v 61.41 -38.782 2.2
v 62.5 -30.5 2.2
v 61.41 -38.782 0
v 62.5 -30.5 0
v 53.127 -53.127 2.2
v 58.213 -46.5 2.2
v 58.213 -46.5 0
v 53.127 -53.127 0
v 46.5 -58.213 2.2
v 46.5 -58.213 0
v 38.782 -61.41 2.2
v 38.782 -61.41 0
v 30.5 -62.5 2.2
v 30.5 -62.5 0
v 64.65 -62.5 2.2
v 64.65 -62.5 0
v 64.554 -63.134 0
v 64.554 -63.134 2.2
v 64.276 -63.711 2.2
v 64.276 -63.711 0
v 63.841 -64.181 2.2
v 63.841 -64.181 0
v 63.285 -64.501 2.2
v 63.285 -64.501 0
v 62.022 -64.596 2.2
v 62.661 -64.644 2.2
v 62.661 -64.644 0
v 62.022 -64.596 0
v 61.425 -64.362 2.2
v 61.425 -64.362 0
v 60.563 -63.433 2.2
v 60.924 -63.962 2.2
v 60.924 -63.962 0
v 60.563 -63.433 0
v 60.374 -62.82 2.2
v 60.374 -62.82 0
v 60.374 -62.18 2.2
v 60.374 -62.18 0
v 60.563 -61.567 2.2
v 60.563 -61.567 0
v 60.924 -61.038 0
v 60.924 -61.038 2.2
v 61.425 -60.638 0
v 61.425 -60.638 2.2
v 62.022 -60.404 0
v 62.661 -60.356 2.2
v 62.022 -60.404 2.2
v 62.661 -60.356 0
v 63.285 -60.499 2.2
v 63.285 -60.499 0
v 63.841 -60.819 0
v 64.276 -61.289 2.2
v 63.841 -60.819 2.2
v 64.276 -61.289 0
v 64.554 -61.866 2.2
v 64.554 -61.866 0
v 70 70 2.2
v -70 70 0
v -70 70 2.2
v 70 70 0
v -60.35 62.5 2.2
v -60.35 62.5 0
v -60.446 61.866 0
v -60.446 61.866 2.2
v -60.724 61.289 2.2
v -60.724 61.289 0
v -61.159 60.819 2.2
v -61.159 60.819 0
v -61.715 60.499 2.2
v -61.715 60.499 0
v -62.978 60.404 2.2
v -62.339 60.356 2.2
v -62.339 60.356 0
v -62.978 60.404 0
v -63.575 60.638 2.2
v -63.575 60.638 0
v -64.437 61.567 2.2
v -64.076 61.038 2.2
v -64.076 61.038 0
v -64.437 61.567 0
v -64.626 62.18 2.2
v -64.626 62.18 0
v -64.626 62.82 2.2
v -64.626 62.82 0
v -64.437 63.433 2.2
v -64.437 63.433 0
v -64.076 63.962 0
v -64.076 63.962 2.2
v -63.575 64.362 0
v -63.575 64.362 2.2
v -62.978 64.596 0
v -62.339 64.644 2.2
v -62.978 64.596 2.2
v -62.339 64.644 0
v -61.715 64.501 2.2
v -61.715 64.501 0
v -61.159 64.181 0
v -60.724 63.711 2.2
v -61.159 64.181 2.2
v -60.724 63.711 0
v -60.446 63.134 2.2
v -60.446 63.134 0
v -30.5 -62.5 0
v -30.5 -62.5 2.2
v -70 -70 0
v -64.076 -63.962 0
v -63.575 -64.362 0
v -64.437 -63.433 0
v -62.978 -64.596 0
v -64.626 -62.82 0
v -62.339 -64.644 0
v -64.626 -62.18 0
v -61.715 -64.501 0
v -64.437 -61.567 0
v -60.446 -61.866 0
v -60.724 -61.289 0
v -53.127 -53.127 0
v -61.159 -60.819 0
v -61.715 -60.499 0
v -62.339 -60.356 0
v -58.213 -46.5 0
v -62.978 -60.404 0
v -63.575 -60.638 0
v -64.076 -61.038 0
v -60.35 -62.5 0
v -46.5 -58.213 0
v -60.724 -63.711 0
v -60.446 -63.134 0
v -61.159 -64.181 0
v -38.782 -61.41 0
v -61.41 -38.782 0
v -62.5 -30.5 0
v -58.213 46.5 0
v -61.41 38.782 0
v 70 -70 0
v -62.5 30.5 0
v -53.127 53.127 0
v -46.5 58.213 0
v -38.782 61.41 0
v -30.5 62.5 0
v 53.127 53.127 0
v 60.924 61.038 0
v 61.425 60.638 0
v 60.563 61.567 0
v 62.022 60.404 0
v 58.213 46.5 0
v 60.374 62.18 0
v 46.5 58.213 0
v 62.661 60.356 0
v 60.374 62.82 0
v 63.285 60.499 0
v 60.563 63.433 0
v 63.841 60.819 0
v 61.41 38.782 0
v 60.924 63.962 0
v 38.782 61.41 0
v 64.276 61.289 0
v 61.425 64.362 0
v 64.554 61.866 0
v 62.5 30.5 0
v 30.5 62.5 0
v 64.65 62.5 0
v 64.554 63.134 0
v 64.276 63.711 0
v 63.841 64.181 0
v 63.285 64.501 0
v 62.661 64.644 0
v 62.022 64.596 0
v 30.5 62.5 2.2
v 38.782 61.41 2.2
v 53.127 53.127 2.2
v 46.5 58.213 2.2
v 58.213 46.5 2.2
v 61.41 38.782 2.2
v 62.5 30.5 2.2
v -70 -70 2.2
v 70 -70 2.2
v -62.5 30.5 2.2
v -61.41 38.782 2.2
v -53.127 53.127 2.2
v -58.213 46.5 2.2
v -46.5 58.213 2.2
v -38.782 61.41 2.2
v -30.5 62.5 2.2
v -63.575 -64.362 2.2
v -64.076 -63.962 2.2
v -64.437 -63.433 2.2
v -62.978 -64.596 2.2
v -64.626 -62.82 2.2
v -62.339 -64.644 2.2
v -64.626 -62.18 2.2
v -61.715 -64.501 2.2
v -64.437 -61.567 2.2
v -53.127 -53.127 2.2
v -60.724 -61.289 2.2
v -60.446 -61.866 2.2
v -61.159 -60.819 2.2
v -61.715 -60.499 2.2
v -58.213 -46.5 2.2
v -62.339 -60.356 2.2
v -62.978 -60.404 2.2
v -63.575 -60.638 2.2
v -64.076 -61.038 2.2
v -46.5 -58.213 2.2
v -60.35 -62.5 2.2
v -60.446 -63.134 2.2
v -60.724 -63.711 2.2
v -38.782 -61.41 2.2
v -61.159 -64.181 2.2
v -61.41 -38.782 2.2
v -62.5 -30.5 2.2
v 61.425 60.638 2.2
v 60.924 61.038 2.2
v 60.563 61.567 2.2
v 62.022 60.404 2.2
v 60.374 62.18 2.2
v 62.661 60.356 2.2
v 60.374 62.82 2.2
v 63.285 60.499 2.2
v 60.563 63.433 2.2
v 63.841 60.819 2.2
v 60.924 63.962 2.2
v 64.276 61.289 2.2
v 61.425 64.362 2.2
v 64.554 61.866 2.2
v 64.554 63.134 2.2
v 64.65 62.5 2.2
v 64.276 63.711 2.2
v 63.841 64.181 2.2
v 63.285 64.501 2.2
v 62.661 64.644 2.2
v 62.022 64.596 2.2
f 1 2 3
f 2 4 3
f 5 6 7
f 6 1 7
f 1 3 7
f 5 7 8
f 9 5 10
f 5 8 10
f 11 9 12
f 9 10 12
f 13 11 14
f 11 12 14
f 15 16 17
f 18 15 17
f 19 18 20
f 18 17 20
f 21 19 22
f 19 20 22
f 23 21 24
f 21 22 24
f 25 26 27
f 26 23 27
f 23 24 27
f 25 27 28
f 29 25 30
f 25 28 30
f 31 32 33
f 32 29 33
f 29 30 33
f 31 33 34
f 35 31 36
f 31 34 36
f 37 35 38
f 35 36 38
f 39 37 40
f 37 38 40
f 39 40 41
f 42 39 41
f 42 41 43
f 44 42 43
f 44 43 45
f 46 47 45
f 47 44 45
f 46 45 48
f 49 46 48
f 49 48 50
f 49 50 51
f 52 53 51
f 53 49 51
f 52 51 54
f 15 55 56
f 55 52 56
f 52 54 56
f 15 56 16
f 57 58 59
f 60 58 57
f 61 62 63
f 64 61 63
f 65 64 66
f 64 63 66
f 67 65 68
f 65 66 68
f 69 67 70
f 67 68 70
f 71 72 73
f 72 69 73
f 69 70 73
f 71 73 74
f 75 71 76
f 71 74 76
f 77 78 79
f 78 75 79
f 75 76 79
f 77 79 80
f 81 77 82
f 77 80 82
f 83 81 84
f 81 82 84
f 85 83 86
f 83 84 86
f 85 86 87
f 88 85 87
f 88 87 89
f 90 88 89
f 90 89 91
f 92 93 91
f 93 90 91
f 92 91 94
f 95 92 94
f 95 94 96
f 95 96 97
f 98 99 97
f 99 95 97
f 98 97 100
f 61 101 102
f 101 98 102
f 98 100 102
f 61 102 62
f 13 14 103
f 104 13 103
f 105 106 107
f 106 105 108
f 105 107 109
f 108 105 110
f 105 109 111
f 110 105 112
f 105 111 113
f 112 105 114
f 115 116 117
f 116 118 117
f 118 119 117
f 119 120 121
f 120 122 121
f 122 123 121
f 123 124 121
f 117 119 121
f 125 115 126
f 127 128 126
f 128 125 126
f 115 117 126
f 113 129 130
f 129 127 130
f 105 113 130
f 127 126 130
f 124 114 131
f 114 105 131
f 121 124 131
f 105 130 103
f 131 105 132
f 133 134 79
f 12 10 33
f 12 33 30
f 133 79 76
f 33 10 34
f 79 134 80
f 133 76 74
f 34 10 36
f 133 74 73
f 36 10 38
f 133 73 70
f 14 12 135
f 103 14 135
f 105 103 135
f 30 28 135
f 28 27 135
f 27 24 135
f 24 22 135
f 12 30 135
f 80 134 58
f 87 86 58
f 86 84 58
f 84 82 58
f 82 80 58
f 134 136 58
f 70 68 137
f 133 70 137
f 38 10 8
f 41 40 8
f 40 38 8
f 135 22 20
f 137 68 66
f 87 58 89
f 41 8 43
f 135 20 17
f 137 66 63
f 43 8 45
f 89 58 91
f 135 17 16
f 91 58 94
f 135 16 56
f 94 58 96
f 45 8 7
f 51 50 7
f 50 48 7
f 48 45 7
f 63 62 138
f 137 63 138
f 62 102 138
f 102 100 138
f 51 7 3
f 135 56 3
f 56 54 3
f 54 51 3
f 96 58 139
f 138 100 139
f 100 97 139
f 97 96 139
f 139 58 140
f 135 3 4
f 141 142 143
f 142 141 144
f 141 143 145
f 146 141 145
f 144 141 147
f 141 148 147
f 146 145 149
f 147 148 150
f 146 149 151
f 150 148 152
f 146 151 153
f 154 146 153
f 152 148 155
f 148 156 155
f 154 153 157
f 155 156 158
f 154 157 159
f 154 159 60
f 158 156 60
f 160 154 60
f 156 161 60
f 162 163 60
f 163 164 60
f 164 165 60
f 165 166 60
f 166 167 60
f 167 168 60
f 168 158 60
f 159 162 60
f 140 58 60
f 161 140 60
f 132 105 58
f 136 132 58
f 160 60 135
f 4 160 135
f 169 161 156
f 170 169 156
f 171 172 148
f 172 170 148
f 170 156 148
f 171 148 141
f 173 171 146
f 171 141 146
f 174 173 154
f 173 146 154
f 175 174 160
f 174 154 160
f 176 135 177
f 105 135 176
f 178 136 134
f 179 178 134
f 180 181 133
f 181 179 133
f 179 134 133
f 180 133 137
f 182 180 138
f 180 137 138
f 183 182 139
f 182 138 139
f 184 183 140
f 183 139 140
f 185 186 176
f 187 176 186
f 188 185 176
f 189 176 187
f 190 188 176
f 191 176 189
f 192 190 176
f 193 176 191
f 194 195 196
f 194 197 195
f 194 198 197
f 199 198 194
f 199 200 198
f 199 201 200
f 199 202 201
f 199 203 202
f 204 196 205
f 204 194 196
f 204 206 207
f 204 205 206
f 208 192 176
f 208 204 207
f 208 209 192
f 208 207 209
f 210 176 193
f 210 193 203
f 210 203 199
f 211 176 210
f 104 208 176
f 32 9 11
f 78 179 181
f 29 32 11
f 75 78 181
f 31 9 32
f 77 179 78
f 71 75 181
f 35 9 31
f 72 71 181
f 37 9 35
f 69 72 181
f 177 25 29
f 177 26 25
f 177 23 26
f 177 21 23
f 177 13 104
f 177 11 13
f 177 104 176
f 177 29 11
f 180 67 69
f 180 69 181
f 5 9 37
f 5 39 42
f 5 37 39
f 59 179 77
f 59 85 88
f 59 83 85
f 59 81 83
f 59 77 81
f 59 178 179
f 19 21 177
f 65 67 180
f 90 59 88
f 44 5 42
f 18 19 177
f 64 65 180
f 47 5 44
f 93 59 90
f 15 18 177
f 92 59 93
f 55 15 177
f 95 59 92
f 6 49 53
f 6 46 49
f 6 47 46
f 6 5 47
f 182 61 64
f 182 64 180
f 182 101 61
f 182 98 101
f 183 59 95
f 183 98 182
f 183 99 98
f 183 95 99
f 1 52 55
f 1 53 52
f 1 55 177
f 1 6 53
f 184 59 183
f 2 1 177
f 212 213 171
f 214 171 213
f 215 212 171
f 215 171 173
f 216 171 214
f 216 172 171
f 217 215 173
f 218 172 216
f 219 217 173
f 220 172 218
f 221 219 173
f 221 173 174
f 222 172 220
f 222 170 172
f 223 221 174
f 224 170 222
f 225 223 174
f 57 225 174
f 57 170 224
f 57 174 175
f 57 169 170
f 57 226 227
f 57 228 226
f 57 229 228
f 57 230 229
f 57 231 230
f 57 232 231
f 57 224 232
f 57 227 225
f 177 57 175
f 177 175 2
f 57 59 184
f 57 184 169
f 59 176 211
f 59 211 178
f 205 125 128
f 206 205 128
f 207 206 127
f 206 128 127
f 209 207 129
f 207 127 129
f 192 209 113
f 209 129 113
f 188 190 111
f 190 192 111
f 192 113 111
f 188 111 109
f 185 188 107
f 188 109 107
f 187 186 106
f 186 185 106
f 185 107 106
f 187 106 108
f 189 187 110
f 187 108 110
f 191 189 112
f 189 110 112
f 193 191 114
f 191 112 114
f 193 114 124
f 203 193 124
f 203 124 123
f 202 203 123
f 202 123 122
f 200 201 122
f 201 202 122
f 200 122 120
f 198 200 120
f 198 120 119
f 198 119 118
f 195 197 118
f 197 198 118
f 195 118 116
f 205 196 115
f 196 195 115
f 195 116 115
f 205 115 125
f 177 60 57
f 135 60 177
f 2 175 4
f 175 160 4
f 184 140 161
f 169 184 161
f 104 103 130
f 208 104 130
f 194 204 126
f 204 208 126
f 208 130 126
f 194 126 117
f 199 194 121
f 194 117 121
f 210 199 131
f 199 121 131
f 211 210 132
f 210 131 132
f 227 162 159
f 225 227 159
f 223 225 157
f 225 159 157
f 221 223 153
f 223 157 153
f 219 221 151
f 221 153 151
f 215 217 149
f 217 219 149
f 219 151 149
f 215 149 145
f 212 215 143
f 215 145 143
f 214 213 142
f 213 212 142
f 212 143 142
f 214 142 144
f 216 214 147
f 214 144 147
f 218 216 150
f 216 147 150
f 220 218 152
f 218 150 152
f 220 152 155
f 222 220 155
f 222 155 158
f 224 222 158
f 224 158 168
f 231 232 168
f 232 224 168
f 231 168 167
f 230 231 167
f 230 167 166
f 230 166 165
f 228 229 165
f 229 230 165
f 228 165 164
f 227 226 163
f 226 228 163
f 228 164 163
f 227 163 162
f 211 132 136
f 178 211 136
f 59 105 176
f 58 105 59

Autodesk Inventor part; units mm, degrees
ref_plane "YZ Plane" through (0, 0, 0) normal (1, 0, 0) x (0, 1, 0)
ref_plane "XZ Plane" through (0, 0, 0) normal (0, 1, 0) x (-1, 0, 0)
ref_plane "XY Plane" through (0, 0, 0) normal (0, 0, 1) x (1, 0, 0)
sketch "スケッチ1" plane through (0, 0, 0) normal (0, 0, 1) x (1, 0, 0)
  line L0 (-70, 70) -> (70, 70)
  line L1 (70, 70) -> (70, -70)
  line L2 (70, -70) -> (-70, -70)
  line L3 (-70, -70) -> (-70, 70)
  line L4 (-62.5, 62.5) -> (62.5, 62.5) construction
  line L5 (62.5, 62.5) -> (62.5, -62.5) construction
  line L6 (62.5, -62.5) -> (-62.5, -62.5) construction
  line L7 (-62.5, -62.5) -> (-62.5, 62.5) construction
  circle A0 centre (-62.5, 62.5) radius 2.15
  line L8 (-30.5, 62.5) -> (30.5, 62.5)
  line L9 (62.5, 30.5) -> (62.5, -30.5)
  line L10 (30.5, -62.5) -> (-30.5, -62.5)
  line L11 (-62.5, -30.5) -> (-62.5, 30.5)
  arc A1 (-30.5, 62.5) -> (-62.5, 30.5) centre (-30.5, 30.5) ccw
  arc A2 (-62.5, -30.5) -> (-30.5, -62.5) centre (-30.5, -30.5) ccw
  arc A3 (30.5, -62.5) -> (62.5, -30.5) centre (30.5, -30.5) ccw
  arc A4 (62.5, 30.5) -> (30.5, 62.5) centre (30.5, 30.5) ccw
  line L12 (53.1274, 53.1274) -> (-53.1274, -53.1274) construction
  circle A5 centre (-62.5, -62.5) radius 2.15
  circle A6 centre (62.5, -62.5) radius 2.15
  circle A7 centre (62.5, 62.5) radius 2.15
  point P0 (0, 0)
  point P1 (-70, 0)
  point P2 (0, 70)
  point P3 (-62.5, 0)
  point P4 (0, 62.5)
  dimension "d0" = 140
  dimension "d1" = 125
  dimension "d3" = 4.3
  dimension "d4" = 32
  dimension "d5" = 150.267
extrude "押し出し1" add sketch "スケッチ1" along normal blind 2.2
properties part number "mesh_140" material "アルミニウム 6061"
